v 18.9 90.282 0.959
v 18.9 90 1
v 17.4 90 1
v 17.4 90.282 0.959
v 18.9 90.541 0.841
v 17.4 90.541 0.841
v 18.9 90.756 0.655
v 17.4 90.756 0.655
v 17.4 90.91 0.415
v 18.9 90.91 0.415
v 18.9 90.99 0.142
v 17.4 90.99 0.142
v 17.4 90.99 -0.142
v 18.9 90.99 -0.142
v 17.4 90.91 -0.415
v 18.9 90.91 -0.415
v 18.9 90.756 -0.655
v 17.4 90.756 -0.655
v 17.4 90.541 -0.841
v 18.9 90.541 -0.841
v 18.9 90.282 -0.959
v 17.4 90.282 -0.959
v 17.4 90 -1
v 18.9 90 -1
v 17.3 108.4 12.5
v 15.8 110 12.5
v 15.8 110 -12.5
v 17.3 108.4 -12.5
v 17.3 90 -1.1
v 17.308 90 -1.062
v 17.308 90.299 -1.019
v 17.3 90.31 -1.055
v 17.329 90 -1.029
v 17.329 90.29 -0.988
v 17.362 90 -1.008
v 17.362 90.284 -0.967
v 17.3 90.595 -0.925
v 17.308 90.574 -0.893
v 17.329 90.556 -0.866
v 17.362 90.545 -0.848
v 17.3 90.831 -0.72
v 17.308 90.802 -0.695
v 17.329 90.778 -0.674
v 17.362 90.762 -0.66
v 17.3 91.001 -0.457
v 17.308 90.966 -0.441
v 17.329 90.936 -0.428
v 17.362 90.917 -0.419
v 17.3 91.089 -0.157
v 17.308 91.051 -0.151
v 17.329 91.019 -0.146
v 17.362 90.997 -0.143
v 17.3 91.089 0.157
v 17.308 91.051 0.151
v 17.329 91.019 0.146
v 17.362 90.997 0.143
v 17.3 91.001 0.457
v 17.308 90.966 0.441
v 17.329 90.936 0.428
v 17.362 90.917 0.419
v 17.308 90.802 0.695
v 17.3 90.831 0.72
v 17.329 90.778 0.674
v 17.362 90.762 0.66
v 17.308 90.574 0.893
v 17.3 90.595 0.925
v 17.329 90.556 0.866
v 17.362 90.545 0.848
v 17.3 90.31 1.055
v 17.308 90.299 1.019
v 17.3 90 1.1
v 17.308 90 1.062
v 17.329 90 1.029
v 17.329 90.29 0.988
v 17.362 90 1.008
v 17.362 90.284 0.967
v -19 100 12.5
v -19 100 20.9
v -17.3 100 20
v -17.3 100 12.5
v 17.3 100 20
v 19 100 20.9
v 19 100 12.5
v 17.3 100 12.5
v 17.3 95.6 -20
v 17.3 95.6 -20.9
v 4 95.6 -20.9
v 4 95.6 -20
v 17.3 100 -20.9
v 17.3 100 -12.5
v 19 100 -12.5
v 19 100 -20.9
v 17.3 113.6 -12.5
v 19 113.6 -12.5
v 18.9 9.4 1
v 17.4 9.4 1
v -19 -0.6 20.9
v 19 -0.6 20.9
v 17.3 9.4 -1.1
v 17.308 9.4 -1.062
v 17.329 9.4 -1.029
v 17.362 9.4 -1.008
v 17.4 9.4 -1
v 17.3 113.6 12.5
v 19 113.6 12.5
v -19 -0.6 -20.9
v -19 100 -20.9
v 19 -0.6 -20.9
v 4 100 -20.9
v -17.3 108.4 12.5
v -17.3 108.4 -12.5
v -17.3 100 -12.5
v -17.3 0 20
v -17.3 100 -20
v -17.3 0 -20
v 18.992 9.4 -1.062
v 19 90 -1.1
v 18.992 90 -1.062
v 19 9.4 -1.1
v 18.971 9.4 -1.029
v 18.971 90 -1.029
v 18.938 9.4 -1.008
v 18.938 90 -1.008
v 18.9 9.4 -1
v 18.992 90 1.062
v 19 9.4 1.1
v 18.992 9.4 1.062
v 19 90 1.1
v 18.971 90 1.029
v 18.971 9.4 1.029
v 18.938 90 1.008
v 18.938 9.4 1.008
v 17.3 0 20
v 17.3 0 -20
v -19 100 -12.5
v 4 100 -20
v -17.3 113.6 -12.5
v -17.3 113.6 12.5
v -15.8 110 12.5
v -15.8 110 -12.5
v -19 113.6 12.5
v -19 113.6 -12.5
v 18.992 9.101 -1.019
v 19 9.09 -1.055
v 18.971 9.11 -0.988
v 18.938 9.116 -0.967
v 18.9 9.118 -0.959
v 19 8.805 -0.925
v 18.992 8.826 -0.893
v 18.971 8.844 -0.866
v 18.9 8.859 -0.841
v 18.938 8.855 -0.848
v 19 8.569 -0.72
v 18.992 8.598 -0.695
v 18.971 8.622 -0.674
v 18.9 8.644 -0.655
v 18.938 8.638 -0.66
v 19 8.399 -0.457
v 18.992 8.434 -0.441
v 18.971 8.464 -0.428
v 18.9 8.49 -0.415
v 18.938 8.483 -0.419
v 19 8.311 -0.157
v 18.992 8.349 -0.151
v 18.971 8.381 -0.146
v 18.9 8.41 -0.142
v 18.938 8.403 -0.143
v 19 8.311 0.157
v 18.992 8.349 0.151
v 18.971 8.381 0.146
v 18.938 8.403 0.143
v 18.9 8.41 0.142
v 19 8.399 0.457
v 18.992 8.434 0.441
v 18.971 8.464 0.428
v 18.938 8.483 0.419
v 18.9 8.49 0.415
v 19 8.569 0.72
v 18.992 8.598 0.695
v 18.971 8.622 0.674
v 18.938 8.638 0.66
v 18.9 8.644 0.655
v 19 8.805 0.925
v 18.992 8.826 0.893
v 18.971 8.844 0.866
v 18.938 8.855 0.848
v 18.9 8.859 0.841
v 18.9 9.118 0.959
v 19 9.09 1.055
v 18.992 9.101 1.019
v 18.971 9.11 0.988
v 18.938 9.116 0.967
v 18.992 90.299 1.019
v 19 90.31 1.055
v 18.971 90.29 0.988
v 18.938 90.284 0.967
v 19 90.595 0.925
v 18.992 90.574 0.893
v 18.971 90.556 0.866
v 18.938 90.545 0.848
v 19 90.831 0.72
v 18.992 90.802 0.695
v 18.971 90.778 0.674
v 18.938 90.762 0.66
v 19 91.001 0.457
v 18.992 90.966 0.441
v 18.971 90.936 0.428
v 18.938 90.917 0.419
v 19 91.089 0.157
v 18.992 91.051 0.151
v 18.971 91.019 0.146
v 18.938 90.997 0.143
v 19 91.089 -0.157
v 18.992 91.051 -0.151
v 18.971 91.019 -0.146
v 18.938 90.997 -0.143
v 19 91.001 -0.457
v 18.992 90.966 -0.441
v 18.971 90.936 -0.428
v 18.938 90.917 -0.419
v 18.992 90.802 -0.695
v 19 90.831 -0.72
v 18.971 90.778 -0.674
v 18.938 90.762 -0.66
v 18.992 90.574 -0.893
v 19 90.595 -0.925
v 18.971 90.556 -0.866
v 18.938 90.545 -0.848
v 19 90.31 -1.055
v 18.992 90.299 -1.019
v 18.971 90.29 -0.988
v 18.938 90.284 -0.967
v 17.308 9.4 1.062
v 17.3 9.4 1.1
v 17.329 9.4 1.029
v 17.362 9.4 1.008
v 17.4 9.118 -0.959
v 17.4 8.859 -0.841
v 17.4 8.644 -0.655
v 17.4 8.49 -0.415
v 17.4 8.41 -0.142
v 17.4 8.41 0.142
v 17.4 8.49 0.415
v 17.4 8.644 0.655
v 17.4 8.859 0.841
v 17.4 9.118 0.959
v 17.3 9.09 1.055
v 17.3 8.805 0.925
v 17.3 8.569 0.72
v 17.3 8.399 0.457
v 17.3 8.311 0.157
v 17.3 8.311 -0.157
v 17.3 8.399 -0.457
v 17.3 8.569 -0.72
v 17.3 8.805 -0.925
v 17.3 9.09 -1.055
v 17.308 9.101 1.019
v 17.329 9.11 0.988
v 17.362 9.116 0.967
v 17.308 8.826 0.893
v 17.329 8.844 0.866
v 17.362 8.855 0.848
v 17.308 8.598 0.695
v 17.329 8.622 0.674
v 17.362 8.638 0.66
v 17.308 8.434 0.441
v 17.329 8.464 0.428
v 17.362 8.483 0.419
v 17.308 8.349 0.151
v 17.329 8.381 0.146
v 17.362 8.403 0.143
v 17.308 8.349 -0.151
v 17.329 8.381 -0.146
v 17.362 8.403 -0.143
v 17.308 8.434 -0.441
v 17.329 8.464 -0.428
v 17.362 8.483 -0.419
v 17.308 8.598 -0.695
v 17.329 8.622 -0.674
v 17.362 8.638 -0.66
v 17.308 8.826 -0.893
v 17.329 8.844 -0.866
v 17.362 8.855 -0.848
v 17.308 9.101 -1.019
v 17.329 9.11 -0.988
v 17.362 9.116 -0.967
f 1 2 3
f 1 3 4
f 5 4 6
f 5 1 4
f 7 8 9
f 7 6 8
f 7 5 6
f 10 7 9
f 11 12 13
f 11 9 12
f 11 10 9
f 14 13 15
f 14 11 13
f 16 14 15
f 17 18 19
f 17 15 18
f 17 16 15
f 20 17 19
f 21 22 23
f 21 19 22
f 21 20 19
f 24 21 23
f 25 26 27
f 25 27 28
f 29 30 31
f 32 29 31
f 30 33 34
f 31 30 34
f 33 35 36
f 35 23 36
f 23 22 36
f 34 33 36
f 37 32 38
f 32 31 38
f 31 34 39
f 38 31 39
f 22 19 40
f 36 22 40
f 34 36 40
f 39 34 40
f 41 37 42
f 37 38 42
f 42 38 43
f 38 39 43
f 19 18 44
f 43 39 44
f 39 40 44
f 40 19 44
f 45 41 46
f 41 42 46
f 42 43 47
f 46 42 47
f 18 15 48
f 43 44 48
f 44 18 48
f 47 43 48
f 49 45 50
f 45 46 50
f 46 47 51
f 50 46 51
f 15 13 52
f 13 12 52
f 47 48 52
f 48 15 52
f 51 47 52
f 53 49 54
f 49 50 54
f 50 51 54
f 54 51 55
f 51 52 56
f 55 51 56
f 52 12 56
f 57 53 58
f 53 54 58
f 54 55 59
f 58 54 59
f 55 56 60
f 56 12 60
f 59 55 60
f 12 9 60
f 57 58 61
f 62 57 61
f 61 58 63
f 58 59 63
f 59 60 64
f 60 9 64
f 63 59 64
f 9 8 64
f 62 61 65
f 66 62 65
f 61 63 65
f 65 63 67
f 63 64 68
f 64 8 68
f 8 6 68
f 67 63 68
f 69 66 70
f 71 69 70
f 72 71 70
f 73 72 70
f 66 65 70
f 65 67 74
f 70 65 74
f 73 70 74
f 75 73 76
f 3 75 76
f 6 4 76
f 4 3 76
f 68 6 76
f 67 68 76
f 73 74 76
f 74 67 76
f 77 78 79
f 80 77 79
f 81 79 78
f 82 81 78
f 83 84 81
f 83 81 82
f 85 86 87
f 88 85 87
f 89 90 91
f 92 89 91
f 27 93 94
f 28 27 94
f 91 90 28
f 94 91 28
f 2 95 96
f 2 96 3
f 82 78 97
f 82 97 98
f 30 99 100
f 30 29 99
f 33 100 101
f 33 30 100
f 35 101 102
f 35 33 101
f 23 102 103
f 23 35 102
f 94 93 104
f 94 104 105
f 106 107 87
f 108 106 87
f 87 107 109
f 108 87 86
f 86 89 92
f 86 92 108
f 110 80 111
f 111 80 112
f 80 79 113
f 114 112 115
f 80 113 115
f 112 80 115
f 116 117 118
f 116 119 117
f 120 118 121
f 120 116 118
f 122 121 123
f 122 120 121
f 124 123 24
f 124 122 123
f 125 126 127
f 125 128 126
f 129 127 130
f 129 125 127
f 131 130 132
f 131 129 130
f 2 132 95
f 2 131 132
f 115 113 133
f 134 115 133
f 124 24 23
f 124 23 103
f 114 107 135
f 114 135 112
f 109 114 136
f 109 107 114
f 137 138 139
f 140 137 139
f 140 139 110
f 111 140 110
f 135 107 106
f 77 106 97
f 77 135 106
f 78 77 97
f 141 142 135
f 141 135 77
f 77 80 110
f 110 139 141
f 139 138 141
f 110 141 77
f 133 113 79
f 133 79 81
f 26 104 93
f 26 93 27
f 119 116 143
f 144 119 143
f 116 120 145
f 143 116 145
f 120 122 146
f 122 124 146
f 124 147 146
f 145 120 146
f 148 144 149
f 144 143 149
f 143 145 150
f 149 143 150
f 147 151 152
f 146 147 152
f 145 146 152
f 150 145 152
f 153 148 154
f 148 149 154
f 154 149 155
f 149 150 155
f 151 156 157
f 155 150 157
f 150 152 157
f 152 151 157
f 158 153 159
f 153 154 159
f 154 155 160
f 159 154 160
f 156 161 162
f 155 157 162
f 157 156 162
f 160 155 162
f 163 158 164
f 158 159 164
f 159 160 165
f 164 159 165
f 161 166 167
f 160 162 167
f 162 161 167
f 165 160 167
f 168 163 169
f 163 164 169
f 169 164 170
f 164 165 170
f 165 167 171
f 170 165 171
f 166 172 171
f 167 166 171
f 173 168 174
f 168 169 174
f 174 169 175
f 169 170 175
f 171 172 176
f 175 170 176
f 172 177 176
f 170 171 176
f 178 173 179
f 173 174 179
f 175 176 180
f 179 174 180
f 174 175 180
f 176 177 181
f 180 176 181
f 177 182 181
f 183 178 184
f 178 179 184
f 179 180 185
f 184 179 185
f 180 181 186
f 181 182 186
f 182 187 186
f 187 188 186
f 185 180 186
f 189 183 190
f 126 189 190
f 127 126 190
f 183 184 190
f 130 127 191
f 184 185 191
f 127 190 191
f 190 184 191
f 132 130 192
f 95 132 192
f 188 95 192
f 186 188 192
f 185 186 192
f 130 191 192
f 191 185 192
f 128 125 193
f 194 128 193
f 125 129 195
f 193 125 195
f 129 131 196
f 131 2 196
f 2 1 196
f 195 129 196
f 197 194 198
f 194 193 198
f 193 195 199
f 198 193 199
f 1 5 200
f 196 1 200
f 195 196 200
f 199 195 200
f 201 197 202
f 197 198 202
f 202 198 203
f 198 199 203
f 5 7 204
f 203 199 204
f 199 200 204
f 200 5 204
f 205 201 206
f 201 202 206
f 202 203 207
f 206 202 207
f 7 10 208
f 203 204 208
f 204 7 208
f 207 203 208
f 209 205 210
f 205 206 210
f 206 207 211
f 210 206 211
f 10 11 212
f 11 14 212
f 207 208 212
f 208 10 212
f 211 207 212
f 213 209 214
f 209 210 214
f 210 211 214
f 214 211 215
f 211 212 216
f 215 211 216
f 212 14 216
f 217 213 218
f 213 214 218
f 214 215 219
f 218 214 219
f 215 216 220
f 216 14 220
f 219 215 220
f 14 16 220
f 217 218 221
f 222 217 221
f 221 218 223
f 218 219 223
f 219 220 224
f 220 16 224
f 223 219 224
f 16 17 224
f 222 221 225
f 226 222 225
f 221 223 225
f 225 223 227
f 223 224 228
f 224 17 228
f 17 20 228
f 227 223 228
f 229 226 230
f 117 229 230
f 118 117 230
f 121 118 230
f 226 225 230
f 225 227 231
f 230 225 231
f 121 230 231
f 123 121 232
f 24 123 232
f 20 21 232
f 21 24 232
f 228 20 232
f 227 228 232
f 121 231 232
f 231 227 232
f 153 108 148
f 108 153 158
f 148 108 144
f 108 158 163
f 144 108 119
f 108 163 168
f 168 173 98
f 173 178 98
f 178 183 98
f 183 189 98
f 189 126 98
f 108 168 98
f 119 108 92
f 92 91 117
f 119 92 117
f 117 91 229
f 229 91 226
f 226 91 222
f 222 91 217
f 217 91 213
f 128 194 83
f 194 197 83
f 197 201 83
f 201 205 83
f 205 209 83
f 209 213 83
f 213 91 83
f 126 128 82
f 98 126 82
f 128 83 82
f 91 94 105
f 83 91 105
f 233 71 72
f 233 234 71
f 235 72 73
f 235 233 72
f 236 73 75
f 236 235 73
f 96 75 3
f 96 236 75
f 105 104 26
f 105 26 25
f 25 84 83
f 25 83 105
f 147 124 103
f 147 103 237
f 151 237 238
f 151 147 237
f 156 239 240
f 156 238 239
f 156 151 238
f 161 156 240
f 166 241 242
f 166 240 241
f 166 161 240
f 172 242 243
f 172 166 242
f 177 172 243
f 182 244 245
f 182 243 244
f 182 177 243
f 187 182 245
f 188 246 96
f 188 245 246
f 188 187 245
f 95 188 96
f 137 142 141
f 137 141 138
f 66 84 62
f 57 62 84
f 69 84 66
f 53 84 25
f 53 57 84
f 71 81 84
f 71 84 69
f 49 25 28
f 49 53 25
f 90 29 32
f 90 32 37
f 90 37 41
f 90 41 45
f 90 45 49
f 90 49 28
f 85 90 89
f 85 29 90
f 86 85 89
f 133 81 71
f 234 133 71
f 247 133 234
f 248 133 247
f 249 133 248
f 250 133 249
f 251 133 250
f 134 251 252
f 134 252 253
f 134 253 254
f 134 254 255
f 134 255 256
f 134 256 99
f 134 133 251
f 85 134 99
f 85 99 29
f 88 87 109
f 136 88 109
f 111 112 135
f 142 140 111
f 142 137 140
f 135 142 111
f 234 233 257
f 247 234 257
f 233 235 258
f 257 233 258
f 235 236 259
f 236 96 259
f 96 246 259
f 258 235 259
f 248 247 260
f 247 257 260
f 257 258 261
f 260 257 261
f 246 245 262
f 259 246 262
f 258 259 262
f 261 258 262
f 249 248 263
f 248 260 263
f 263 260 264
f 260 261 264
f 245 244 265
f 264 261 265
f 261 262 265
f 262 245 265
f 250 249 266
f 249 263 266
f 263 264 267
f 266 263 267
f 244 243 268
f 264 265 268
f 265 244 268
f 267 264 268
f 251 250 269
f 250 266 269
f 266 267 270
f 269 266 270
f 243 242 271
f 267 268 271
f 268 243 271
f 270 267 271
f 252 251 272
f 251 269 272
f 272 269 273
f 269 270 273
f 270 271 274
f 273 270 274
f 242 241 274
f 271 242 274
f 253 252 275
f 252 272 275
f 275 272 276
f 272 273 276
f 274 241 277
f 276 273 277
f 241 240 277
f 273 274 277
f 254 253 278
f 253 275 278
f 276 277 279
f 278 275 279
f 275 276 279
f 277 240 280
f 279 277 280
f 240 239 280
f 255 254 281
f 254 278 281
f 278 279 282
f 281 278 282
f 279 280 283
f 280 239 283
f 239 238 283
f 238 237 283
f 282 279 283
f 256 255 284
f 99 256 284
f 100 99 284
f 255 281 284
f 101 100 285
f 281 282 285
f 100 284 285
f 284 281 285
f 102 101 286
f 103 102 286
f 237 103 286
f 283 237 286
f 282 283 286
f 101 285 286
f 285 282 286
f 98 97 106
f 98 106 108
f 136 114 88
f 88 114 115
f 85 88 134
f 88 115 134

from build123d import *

# Parameters (mm, degrees)
SKETCH1_W           = 38
SKETCH1_H           = 41.8
SKETCH1_W_2         = 34.6
SKETCH1_H_2         = 40
BOSS_EXTRUDE1_DEPTH = 100
SKETCH2_W           = 1.7
SKETCH2_H           = 25
BOSS_EXTRUDE2_DEPTH = 13.6
BOSS_EXTRUDE5_DEPTH = 25
SKETCH6_W           = 38
SKETCH6_H           = 41.8
BOSS_EXTRUDE6_DEPTH = 0.6
SKETCH7_W           = 13.3
SKETCH7_H           = 4.4
CUT_EXTRUDE1_DEPTH  = 10
CUT_EXTRUDE2_DEPTH  = 10
FILLET1_R           = 0.1


with BuildPart() as part:
    # Sketch1 → Boss-Extrude1 (new body)
    with BuildSketch(Plane(origin=(0, 0, 0), x_dir=(1, 0, 0), z_dir=(0, 1, 0))):
        Rectangle(SKETCH1_W, SKETCH1_H)
        Rectangle(SKETCH1_W_2, SKETCH1_H_2, mode=Mode.SUBTRACT)
    extrude(amount=BOSS_EXTRUDE1_DEPTH)

    # Sketch2 → Boss-Extrude2 (add)
    with BuildSketch(Plane(origin=(0, 100, 0), x_dir=(1, 0, 0), z_dir=(0, 1, 0))):
        with Locations((18.15, 0)):
            Rectangle(SKETCH2_W, SKETCH2_H)
        with Locations((-18.15, 0)):
            Rectangle(SKETCH2_W, SKETCH2_H)
    extrude(amount=BOSS_EXTRUDE2_DEPTH)

    # Sketch5 → Boss-Extrude5 (add)
    with BuildSketch(Plane.XY.offset(12.5)):
        Polygon((-15.8, 110), (-17.3, 108.4), (-17.3, 113.6), align=None)
        Polygon((17.3, 108.4), (17.3, 113.6), (15.8, 110), align=None)
    extrude(amount=-BOSS_EXTRUDE5_DEPTH)

    # Sketch6 → Boss-Extrude6 (add)
    with BuildSketch(Plane.XZ):
        Rectangle(SKETCH6_W, SKETCH6_H)
    extrude(amount=BOSS_EXTRUDE6_DEPTH)

    # Sketch7 → Cut-Extrude1 (cut)
    with BuildSketch(Plane(origin=(0, 0, -20.9), x_dir=(-1, 0, 0), z_dir=(0, 0, -1))):
        with Locations((-10.65, 97.8)):
            Rectangle(SKETCH7_W, SKETCH7_H)
    extrude(amount=-CUT_EXTRUDE1_DEPTH, mode=Mode.SUBTRACT)

    # Sketch8 → Cut-Extrude2 (cut)
    with BuildSketch(Plane(origin=(19, 0, 0), x_dir=(0, 0, -1), z_dir=(1, 0, 0))):
        with BuildLine():
            Line((-1, 9.4), (-1, 90))
            ThreePointArc((-1, 90), (0, 91), (1, 90))
            Line((1, 90), (1, 9.4))
            ThreePointArc((1, 9.4), (0, 8.4), (-1, 9.4))
        make_face()
    extrude(amount=-CUT_EXTRUDE2_DEPTH, mode=Mode.SUBTRACT)

    # Fillet1
    fillet1_edges = [part.edges().sort_by_distance(p)[0] for p in [
        (17.3, 49.7, -1),
        (17.3, 91, 0),
        (17.3, 49.7, 1),
        (17.3, 8.4, 0),
        (19, 8.4, 0),
        (19, 49.7, -1),
        (19, 91, 0),
        (19, 49.7, 1),
    ]]
    fillet(fillet1_edges, radius=FILLET1_R)


solid = part.part
